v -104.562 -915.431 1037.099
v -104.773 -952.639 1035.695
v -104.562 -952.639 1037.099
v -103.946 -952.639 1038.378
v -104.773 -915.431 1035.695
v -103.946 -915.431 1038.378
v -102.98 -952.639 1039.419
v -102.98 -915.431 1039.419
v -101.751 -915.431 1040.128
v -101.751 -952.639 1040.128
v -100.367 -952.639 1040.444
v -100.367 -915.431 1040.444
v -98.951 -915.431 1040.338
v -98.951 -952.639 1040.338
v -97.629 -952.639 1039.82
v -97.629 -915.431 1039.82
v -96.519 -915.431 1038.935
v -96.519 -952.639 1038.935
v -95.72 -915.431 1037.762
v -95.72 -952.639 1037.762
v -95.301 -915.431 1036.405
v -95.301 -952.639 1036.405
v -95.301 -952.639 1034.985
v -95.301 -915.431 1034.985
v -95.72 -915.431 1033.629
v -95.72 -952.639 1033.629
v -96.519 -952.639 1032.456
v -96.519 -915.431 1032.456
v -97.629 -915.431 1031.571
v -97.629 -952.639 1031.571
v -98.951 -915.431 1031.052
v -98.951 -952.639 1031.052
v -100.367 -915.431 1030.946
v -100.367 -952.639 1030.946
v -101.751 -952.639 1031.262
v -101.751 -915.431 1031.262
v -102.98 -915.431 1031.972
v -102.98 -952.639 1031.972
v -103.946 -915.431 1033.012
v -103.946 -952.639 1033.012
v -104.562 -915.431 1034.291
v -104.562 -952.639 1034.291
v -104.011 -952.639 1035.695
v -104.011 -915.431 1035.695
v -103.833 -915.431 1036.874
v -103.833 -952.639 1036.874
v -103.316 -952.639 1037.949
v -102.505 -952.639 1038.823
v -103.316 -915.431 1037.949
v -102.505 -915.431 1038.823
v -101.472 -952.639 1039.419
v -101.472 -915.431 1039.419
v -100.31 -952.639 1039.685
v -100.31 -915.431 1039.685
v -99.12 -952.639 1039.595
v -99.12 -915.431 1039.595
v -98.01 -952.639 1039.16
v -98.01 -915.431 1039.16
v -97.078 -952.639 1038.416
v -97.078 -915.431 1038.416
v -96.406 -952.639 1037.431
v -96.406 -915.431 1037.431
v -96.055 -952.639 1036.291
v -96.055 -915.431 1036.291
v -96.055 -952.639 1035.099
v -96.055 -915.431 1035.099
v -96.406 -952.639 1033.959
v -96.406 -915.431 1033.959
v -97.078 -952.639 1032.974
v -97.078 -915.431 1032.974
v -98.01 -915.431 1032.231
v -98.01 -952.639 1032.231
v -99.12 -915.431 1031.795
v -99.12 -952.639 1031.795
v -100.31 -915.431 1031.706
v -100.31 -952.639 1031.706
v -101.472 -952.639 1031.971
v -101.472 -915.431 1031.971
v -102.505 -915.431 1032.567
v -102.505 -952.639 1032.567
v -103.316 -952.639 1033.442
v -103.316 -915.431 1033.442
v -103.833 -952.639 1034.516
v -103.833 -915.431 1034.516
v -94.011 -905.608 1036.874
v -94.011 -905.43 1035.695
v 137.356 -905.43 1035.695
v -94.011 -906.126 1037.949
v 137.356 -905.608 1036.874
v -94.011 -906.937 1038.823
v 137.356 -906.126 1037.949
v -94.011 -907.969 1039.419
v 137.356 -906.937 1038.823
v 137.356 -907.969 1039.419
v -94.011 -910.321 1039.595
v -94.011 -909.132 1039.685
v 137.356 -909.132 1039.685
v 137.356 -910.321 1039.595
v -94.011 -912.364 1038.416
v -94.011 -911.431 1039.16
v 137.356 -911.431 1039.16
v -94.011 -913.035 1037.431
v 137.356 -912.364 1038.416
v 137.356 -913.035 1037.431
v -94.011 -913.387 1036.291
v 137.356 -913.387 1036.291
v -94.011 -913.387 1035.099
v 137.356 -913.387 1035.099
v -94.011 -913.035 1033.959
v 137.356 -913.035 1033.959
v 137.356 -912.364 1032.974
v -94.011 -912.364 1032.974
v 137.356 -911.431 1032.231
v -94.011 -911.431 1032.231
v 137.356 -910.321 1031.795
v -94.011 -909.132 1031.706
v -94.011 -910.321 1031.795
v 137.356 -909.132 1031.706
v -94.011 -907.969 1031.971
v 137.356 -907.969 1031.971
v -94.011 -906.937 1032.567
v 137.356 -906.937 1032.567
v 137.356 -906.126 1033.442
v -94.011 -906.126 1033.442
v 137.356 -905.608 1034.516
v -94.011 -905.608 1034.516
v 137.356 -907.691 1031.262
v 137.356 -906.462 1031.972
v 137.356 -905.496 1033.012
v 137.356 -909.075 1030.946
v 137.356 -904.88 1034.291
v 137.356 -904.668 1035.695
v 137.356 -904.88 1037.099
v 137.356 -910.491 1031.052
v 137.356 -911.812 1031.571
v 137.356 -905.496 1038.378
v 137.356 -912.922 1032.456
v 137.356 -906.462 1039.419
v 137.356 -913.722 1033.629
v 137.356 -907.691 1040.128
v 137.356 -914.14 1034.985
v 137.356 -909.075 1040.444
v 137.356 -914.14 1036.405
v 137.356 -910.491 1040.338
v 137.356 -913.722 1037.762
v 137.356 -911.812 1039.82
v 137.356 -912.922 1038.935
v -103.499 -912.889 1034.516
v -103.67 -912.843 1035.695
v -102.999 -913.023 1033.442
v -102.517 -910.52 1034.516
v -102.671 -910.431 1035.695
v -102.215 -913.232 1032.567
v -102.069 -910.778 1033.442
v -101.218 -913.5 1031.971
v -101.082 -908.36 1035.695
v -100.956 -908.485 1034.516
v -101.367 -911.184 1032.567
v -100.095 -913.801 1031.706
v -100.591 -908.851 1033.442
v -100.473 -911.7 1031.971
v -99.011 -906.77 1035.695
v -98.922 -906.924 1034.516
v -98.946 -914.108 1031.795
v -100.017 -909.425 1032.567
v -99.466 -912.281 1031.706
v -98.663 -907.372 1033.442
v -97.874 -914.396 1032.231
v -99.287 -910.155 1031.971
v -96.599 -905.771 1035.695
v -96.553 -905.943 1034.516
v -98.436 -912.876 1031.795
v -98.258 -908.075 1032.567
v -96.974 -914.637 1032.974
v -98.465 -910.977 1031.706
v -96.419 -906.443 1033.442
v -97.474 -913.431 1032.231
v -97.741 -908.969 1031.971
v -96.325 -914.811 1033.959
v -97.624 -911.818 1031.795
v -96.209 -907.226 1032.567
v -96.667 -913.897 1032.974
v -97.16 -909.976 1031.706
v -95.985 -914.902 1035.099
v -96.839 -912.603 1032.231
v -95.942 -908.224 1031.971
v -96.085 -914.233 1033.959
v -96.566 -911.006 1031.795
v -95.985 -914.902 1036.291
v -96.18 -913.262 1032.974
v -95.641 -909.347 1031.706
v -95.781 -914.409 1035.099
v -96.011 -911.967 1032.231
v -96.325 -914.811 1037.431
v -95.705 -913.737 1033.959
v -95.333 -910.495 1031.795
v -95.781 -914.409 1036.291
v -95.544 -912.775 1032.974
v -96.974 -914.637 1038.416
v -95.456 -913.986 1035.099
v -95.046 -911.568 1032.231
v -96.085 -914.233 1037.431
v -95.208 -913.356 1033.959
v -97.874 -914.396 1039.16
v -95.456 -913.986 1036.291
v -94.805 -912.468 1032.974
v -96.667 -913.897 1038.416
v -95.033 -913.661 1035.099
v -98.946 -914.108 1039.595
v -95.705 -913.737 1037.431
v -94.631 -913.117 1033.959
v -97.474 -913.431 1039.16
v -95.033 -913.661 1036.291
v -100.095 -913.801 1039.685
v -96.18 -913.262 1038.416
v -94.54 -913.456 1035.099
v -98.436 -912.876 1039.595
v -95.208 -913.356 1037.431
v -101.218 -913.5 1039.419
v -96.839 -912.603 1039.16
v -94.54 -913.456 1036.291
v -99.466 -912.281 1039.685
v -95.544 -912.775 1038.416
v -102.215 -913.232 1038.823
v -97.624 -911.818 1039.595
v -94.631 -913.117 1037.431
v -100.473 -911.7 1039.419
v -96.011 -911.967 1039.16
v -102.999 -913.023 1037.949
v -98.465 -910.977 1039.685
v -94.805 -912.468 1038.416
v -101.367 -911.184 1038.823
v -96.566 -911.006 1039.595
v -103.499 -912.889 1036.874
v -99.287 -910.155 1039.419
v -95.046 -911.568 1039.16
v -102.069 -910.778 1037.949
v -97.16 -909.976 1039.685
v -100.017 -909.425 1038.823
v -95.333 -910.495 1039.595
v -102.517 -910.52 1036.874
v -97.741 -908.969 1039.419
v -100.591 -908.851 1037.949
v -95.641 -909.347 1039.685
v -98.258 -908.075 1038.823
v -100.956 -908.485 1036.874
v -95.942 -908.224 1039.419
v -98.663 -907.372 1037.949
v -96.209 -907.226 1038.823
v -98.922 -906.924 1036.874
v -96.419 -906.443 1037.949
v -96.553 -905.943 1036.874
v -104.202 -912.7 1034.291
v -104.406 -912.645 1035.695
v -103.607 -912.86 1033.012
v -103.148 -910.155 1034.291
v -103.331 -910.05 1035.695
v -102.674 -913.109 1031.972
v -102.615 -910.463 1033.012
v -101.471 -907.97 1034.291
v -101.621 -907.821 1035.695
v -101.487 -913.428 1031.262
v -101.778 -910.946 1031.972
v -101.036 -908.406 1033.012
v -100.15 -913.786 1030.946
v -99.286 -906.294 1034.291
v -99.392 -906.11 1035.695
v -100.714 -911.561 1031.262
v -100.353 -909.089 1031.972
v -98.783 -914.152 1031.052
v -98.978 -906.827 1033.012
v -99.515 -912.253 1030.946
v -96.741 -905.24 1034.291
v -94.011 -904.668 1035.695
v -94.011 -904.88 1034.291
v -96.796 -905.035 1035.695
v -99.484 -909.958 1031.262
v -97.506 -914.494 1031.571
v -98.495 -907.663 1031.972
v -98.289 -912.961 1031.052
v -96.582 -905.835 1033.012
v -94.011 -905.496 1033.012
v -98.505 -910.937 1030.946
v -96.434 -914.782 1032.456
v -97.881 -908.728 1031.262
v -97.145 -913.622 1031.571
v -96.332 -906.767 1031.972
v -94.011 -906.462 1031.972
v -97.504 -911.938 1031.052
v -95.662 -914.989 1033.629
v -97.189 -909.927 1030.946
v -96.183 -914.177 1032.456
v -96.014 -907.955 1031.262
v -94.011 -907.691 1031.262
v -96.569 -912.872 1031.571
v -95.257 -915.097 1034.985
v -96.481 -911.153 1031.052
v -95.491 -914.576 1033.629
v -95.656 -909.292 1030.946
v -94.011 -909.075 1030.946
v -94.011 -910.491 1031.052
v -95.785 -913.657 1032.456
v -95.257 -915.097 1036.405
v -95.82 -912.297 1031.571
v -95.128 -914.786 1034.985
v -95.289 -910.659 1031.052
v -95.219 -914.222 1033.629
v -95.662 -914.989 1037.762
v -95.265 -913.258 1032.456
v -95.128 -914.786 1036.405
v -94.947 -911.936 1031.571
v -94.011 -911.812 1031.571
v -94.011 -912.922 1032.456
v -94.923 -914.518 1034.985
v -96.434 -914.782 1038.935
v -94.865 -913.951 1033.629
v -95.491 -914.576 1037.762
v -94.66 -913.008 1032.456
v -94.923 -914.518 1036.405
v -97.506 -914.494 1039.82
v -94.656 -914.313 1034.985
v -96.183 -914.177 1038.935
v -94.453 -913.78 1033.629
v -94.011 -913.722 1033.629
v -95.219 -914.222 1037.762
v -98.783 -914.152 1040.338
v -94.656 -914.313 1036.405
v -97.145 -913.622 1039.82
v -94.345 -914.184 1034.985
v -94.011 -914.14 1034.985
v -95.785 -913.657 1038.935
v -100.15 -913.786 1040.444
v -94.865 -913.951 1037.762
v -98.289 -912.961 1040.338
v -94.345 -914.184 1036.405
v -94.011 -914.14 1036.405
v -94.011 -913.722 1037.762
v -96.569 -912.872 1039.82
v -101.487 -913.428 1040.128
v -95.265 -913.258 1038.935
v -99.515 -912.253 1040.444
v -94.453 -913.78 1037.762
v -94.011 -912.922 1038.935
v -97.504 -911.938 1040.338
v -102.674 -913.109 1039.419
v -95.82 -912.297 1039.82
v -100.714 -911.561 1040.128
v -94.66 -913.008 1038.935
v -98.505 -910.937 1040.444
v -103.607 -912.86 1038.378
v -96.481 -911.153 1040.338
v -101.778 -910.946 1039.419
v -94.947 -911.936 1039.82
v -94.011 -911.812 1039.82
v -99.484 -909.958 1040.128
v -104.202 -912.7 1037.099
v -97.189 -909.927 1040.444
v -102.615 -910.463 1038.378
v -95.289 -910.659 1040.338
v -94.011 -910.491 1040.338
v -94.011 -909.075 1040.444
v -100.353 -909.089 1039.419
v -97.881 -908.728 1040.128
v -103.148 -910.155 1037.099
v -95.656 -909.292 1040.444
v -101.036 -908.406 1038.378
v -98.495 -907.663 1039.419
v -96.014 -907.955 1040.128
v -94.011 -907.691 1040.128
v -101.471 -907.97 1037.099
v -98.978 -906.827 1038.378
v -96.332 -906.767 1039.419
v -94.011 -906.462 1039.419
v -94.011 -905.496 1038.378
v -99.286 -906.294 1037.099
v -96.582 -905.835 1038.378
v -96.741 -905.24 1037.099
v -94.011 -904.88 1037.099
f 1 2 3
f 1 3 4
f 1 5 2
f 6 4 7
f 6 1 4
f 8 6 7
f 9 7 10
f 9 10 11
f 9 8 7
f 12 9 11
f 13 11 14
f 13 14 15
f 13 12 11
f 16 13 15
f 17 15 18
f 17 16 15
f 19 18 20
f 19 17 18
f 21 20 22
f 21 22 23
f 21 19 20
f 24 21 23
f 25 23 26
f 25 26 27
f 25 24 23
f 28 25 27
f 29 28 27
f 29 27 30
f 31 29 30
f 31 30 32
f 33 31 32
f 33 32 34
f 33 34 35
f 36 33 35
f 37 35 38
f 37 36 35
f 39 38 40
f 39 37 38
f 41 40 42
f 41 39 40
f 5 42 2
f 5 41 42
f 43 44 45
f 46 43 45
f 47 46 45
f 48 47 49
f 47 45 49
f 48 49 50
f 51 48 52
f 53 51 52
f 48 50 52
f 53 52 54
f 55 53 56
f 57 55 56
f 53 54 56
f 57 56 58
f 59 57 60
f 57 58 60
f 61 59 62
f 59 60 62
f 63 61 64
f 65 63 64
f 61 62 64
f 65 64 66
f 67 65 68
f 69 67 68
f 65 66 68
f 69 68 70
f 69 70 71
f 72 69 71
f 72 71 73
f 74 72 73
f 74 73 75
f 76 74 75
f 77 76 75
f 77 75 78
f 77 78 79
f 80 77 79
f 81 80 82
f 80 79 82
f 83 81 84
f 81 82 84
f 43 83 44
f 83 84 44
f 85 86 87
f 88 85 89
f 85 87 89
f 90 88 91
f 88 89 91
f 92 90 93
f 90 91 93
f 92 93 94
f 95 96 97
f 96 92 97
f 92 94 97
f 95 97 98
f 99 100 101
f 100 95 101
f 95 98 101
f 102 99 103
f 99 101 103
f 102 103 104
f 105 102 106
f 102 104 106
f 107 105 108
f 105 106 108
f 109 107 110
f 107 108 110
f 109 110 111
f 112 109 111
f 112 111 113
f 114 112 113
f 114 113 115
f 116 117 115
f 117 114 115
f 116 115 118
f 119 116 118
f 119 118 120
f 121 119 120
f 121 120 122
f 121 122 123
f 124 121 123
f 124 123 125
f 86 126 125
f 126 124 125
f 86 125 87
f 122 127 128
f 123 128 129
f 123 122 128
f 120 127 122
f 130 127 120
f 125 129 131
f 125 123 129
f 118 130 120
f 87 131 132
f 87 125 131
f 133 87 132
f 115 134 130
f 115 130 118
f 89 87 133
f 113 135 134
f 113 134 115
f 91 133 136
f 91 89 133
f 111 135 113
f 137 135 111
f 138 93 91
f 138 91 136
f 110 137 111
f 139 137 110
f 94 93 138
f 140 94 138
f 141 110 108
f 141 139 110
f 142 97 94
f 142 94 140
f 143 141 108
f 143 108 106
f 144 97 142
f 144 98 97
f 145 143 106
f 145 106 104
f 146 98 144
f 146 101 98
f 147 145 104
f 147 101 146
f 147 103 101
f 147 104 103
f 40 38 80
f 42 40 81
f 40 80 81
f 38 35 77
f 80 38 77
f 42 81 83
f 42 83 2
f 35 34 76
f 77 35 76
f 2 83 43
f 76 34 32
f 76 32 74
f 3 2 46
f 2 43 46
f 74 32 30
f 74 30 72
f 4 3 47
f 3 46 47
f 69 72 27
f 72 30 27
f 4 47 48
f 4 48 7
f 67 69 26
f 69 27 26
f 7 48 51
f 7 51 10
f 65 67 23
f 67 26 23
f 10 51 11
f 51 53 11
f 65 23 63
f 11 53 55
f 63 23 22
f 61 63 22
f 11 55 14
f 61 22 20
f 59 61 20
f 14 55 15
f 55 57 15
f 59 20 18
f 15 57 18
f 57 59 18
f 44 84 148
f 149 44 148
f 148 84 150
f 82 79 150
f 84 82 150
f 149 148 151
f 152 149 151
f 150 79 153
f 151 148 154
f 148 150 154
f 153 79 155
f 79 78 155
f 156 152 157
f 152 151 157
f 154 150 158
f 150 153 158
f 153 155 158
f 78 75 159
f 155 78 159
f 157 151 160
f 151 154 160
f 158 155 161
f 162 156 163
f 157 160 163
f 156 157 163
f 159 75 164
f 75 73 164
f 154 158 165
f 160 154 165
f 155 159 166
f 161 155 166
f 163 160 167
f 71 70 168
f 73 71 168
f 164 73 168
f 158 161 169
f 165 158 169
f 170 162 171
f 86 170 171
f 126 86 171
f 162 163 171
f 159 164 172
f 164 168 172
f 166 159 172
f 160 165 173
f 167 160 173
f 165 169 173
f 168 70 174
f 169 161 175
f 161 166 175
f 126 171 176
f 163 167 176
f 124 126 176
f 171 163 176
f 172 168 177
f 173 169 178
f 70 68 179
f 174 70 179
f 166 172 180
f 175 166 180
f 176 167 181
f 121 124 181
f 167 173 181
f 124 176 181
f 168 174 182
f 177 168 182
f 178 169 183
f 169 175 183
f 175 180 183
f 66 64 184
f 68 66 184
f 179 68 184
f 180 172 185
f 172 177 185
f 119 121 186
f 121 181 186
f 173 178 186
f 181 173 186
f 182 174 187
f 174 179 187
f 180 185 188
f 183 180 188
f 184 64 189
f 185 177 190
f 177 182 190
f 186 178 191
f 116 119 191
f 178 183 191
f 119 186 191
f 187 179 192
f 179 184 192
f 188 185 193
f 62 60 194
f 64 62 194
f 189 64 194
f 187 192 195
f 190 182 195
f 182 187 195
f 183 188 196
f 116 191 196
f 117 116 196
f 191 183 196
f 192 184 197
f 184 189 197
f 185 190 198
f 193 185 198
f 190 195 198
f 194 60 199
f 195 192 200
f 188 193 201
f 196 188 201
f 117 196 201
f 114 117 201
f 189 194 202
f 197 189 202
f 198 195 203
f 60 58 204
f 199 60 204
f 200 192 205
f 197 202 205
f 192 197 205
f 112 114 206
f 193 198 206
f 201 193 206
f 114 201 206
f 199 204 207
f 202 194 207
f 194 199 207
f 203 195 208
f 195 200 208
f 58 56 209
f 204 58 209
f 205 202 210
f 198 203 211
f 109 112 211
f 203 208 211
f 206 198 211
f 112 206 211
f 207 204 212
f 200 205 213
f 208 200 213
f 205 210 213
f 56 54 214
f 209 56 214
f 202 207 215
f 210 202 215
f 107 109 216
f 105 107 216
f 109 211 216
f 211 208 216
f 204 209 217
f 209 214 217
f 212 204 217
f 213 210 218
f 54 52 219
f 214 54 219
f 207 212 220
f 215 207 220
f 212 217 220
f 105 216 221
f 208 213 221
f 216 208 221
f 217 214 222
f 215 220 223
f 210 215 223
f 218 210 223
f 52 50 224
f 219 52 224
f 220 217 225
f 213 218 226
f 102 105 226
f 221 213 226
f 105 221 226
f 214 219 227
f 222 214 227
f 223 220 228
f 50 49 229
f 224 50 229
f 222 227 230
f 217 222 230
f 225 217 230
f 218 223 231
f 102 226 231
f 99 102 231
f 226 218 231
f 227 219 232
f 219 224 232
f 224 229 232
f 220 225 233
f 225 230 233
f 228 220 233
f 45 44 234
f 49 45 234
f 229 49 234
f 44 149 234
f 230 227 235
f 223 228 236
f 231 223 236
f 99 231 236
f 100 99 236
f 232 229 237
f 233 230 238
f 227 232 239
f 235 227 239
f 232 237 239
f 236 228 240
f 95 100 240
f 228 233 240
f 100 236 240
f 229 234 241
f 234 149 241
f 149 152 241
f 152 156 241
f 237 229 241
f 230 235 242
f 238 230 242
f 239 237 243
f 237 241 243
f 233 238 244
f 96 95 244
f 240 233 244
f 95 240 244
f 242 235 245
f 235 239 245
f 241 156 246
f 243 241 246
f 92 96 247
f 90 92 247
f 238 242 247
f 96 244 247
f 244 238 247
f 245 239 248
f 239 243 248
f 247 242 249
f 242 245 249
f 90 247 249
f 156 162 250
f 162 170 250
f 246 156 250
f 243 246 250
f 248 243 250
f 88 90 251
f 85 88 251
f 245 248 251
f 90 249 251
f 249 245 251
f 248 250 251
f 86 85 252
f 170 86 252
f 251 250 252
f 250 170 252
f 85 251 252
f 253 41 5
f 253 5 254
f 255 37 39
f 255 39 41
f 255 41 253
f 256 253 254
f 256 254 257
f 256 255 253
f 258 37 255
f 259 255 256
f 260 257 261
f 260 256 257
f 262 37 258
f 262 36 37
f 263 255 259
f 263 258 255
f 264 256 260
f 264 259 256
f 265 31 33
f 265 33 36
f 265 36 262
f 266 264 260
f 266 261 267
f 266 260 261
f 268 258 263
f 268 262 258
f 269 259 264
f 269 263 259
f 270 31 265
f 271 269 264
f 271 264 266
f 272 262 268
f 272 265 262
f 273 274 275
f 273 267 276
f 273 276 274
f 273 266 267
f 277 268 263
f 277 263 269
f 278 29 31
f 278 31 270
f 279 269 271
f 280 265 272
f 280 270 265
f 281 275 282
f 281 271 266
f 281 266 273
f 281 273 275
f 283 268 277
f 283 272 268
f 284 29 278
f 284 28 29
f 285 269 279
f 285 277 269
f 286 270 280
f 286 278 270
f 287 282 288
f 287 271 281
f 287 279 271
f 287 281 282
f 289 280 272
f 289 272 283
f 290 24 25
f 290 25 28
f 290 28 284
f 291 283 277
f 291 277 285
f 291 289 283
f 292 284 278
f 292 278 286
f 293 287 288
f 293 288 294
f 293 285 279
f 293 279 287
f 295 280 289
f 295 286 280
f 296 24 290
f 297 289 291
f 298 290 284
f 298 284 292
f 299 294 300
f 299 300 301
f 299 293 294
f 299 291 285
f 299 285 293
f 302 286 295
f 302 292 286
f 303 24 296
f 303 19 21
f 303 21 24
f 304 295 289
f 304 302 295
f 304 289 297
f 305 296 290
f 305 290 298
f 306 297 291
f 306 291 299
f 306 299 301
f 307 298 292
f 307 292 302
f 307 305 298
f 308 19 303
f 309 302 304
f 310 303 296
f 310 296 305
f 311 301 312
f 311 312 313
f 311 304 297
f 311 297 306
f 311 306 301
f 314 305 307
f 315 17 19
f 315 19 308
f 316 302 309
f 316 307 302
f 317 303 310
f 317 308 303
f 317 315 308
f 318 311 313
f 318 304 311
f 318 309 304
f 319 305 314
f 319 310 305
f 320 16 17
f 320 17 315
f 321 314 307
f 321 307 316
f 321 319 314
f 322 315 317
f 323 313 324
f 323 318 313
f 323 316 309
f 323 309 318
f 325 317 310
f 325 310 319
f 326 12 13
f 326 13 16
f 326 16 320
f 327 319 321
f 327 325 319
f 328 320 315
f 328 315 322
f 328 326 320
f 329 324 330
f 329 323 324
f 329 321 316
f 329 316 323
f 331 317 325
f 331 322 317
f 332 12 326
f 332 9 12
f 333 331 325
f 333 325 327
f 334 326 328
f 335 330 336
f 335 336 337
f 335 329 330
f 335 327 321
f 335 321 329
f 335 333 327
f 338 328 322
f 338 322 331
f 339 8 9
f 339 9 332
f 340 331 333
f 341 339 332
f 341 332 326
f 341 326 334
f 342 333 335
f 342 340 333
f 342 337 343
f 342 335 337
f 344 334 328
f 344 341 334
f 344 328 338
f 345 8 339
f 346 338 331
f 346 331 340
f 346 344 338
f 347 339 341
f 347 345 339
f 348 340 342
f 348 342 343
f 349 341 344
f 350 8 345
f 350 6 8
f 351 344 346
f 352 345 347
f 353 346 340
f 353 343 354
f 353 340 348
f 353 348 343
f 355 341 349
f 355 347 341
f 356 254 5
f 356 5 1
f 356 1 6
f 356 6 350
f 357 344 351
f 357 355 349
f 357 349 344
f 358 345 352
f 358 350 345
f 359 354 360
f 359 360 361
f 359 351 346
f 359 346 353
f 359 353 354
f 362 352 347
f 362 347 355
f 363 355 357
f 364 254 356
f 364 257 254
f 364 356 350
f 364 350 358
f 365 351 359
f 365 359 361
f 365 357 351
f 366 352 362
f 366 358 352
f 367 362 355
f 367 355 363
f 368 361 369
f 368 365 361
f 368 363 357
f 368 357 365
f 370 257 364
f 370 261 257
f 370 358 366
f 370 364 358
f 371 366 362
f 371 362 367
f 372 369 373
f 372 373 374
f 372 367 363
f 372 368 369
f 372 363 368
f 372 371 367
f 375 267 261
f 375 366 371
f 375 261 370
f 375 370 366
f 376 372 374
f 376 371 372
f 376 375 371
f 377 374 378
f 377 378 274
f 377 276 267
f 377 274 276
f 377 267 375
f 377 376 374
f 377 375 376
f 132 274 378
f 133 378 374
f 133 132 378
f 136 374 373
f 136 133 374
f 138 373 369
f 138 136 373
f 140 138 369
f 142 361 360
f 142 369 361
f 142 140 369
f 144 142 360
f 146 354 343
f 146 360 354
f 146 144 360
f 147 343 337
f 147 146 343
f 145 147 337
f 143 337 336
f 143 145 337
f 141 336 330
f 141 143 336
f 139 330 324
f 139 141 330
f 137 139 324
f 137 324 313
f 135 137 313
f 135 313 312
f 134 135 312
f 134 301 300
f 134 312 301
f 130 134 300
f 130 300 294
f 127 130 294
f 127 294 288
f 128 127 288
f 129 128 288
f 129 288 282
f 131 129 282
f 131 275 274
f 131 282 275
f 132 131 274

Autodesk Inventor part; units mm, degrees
ref_plane "YZ Plane" through (0, 0, 0) normal (1, 0, 0) x (0, 1, 0)
ref_plane "XZ Plane" through (0, 0, 0) normal (0, 1, 0) x (-1, 0, 0)
ref_plane "Work Plane1" through (-100.0106, -952.6394, 1035.6952) normal (0, 1, 0) x (-1, 0, 0)
sketch "Sketch3" plane through (-100.0106, -952.6394, 1035.6952) normal (0, 1, 0) x (-1, 0, 0)
  circle A0 centre (0, 0) radius 4.7625
  circle A1 centre (0, 0) radius 4.0005
sketch3d "3D Sketch1"
  line L0 (-100.0106, -952.6394, 1035.6952) -> (-100.0106, -915.4309, 1035.6952)
  arc A0 (-100.0106, -915.4309, 1035.6952) -> (-94.0107, -909.431, 1035.6952) centre (-94.0107, -915.4309, 1035.6952) ccw
  line L1 (-94.0107, -909.431, 1035.6952) -> (137.3561, -909.431, 1035.6952)
  dimension "d4" = 5.9999
sweep "Sweep1" add profiles "Sketch3" path "3D Sketch1"
equation "\"OD\" = 9.525"
equation "\"t\" = 0.762"
equation "\"L\" = PL"
equation "\"ID\" = 8.001"
equation "\"PL\" = 278.003"
equation "\"Size_Designation\" = 1.2345"
properties material "Copper"
